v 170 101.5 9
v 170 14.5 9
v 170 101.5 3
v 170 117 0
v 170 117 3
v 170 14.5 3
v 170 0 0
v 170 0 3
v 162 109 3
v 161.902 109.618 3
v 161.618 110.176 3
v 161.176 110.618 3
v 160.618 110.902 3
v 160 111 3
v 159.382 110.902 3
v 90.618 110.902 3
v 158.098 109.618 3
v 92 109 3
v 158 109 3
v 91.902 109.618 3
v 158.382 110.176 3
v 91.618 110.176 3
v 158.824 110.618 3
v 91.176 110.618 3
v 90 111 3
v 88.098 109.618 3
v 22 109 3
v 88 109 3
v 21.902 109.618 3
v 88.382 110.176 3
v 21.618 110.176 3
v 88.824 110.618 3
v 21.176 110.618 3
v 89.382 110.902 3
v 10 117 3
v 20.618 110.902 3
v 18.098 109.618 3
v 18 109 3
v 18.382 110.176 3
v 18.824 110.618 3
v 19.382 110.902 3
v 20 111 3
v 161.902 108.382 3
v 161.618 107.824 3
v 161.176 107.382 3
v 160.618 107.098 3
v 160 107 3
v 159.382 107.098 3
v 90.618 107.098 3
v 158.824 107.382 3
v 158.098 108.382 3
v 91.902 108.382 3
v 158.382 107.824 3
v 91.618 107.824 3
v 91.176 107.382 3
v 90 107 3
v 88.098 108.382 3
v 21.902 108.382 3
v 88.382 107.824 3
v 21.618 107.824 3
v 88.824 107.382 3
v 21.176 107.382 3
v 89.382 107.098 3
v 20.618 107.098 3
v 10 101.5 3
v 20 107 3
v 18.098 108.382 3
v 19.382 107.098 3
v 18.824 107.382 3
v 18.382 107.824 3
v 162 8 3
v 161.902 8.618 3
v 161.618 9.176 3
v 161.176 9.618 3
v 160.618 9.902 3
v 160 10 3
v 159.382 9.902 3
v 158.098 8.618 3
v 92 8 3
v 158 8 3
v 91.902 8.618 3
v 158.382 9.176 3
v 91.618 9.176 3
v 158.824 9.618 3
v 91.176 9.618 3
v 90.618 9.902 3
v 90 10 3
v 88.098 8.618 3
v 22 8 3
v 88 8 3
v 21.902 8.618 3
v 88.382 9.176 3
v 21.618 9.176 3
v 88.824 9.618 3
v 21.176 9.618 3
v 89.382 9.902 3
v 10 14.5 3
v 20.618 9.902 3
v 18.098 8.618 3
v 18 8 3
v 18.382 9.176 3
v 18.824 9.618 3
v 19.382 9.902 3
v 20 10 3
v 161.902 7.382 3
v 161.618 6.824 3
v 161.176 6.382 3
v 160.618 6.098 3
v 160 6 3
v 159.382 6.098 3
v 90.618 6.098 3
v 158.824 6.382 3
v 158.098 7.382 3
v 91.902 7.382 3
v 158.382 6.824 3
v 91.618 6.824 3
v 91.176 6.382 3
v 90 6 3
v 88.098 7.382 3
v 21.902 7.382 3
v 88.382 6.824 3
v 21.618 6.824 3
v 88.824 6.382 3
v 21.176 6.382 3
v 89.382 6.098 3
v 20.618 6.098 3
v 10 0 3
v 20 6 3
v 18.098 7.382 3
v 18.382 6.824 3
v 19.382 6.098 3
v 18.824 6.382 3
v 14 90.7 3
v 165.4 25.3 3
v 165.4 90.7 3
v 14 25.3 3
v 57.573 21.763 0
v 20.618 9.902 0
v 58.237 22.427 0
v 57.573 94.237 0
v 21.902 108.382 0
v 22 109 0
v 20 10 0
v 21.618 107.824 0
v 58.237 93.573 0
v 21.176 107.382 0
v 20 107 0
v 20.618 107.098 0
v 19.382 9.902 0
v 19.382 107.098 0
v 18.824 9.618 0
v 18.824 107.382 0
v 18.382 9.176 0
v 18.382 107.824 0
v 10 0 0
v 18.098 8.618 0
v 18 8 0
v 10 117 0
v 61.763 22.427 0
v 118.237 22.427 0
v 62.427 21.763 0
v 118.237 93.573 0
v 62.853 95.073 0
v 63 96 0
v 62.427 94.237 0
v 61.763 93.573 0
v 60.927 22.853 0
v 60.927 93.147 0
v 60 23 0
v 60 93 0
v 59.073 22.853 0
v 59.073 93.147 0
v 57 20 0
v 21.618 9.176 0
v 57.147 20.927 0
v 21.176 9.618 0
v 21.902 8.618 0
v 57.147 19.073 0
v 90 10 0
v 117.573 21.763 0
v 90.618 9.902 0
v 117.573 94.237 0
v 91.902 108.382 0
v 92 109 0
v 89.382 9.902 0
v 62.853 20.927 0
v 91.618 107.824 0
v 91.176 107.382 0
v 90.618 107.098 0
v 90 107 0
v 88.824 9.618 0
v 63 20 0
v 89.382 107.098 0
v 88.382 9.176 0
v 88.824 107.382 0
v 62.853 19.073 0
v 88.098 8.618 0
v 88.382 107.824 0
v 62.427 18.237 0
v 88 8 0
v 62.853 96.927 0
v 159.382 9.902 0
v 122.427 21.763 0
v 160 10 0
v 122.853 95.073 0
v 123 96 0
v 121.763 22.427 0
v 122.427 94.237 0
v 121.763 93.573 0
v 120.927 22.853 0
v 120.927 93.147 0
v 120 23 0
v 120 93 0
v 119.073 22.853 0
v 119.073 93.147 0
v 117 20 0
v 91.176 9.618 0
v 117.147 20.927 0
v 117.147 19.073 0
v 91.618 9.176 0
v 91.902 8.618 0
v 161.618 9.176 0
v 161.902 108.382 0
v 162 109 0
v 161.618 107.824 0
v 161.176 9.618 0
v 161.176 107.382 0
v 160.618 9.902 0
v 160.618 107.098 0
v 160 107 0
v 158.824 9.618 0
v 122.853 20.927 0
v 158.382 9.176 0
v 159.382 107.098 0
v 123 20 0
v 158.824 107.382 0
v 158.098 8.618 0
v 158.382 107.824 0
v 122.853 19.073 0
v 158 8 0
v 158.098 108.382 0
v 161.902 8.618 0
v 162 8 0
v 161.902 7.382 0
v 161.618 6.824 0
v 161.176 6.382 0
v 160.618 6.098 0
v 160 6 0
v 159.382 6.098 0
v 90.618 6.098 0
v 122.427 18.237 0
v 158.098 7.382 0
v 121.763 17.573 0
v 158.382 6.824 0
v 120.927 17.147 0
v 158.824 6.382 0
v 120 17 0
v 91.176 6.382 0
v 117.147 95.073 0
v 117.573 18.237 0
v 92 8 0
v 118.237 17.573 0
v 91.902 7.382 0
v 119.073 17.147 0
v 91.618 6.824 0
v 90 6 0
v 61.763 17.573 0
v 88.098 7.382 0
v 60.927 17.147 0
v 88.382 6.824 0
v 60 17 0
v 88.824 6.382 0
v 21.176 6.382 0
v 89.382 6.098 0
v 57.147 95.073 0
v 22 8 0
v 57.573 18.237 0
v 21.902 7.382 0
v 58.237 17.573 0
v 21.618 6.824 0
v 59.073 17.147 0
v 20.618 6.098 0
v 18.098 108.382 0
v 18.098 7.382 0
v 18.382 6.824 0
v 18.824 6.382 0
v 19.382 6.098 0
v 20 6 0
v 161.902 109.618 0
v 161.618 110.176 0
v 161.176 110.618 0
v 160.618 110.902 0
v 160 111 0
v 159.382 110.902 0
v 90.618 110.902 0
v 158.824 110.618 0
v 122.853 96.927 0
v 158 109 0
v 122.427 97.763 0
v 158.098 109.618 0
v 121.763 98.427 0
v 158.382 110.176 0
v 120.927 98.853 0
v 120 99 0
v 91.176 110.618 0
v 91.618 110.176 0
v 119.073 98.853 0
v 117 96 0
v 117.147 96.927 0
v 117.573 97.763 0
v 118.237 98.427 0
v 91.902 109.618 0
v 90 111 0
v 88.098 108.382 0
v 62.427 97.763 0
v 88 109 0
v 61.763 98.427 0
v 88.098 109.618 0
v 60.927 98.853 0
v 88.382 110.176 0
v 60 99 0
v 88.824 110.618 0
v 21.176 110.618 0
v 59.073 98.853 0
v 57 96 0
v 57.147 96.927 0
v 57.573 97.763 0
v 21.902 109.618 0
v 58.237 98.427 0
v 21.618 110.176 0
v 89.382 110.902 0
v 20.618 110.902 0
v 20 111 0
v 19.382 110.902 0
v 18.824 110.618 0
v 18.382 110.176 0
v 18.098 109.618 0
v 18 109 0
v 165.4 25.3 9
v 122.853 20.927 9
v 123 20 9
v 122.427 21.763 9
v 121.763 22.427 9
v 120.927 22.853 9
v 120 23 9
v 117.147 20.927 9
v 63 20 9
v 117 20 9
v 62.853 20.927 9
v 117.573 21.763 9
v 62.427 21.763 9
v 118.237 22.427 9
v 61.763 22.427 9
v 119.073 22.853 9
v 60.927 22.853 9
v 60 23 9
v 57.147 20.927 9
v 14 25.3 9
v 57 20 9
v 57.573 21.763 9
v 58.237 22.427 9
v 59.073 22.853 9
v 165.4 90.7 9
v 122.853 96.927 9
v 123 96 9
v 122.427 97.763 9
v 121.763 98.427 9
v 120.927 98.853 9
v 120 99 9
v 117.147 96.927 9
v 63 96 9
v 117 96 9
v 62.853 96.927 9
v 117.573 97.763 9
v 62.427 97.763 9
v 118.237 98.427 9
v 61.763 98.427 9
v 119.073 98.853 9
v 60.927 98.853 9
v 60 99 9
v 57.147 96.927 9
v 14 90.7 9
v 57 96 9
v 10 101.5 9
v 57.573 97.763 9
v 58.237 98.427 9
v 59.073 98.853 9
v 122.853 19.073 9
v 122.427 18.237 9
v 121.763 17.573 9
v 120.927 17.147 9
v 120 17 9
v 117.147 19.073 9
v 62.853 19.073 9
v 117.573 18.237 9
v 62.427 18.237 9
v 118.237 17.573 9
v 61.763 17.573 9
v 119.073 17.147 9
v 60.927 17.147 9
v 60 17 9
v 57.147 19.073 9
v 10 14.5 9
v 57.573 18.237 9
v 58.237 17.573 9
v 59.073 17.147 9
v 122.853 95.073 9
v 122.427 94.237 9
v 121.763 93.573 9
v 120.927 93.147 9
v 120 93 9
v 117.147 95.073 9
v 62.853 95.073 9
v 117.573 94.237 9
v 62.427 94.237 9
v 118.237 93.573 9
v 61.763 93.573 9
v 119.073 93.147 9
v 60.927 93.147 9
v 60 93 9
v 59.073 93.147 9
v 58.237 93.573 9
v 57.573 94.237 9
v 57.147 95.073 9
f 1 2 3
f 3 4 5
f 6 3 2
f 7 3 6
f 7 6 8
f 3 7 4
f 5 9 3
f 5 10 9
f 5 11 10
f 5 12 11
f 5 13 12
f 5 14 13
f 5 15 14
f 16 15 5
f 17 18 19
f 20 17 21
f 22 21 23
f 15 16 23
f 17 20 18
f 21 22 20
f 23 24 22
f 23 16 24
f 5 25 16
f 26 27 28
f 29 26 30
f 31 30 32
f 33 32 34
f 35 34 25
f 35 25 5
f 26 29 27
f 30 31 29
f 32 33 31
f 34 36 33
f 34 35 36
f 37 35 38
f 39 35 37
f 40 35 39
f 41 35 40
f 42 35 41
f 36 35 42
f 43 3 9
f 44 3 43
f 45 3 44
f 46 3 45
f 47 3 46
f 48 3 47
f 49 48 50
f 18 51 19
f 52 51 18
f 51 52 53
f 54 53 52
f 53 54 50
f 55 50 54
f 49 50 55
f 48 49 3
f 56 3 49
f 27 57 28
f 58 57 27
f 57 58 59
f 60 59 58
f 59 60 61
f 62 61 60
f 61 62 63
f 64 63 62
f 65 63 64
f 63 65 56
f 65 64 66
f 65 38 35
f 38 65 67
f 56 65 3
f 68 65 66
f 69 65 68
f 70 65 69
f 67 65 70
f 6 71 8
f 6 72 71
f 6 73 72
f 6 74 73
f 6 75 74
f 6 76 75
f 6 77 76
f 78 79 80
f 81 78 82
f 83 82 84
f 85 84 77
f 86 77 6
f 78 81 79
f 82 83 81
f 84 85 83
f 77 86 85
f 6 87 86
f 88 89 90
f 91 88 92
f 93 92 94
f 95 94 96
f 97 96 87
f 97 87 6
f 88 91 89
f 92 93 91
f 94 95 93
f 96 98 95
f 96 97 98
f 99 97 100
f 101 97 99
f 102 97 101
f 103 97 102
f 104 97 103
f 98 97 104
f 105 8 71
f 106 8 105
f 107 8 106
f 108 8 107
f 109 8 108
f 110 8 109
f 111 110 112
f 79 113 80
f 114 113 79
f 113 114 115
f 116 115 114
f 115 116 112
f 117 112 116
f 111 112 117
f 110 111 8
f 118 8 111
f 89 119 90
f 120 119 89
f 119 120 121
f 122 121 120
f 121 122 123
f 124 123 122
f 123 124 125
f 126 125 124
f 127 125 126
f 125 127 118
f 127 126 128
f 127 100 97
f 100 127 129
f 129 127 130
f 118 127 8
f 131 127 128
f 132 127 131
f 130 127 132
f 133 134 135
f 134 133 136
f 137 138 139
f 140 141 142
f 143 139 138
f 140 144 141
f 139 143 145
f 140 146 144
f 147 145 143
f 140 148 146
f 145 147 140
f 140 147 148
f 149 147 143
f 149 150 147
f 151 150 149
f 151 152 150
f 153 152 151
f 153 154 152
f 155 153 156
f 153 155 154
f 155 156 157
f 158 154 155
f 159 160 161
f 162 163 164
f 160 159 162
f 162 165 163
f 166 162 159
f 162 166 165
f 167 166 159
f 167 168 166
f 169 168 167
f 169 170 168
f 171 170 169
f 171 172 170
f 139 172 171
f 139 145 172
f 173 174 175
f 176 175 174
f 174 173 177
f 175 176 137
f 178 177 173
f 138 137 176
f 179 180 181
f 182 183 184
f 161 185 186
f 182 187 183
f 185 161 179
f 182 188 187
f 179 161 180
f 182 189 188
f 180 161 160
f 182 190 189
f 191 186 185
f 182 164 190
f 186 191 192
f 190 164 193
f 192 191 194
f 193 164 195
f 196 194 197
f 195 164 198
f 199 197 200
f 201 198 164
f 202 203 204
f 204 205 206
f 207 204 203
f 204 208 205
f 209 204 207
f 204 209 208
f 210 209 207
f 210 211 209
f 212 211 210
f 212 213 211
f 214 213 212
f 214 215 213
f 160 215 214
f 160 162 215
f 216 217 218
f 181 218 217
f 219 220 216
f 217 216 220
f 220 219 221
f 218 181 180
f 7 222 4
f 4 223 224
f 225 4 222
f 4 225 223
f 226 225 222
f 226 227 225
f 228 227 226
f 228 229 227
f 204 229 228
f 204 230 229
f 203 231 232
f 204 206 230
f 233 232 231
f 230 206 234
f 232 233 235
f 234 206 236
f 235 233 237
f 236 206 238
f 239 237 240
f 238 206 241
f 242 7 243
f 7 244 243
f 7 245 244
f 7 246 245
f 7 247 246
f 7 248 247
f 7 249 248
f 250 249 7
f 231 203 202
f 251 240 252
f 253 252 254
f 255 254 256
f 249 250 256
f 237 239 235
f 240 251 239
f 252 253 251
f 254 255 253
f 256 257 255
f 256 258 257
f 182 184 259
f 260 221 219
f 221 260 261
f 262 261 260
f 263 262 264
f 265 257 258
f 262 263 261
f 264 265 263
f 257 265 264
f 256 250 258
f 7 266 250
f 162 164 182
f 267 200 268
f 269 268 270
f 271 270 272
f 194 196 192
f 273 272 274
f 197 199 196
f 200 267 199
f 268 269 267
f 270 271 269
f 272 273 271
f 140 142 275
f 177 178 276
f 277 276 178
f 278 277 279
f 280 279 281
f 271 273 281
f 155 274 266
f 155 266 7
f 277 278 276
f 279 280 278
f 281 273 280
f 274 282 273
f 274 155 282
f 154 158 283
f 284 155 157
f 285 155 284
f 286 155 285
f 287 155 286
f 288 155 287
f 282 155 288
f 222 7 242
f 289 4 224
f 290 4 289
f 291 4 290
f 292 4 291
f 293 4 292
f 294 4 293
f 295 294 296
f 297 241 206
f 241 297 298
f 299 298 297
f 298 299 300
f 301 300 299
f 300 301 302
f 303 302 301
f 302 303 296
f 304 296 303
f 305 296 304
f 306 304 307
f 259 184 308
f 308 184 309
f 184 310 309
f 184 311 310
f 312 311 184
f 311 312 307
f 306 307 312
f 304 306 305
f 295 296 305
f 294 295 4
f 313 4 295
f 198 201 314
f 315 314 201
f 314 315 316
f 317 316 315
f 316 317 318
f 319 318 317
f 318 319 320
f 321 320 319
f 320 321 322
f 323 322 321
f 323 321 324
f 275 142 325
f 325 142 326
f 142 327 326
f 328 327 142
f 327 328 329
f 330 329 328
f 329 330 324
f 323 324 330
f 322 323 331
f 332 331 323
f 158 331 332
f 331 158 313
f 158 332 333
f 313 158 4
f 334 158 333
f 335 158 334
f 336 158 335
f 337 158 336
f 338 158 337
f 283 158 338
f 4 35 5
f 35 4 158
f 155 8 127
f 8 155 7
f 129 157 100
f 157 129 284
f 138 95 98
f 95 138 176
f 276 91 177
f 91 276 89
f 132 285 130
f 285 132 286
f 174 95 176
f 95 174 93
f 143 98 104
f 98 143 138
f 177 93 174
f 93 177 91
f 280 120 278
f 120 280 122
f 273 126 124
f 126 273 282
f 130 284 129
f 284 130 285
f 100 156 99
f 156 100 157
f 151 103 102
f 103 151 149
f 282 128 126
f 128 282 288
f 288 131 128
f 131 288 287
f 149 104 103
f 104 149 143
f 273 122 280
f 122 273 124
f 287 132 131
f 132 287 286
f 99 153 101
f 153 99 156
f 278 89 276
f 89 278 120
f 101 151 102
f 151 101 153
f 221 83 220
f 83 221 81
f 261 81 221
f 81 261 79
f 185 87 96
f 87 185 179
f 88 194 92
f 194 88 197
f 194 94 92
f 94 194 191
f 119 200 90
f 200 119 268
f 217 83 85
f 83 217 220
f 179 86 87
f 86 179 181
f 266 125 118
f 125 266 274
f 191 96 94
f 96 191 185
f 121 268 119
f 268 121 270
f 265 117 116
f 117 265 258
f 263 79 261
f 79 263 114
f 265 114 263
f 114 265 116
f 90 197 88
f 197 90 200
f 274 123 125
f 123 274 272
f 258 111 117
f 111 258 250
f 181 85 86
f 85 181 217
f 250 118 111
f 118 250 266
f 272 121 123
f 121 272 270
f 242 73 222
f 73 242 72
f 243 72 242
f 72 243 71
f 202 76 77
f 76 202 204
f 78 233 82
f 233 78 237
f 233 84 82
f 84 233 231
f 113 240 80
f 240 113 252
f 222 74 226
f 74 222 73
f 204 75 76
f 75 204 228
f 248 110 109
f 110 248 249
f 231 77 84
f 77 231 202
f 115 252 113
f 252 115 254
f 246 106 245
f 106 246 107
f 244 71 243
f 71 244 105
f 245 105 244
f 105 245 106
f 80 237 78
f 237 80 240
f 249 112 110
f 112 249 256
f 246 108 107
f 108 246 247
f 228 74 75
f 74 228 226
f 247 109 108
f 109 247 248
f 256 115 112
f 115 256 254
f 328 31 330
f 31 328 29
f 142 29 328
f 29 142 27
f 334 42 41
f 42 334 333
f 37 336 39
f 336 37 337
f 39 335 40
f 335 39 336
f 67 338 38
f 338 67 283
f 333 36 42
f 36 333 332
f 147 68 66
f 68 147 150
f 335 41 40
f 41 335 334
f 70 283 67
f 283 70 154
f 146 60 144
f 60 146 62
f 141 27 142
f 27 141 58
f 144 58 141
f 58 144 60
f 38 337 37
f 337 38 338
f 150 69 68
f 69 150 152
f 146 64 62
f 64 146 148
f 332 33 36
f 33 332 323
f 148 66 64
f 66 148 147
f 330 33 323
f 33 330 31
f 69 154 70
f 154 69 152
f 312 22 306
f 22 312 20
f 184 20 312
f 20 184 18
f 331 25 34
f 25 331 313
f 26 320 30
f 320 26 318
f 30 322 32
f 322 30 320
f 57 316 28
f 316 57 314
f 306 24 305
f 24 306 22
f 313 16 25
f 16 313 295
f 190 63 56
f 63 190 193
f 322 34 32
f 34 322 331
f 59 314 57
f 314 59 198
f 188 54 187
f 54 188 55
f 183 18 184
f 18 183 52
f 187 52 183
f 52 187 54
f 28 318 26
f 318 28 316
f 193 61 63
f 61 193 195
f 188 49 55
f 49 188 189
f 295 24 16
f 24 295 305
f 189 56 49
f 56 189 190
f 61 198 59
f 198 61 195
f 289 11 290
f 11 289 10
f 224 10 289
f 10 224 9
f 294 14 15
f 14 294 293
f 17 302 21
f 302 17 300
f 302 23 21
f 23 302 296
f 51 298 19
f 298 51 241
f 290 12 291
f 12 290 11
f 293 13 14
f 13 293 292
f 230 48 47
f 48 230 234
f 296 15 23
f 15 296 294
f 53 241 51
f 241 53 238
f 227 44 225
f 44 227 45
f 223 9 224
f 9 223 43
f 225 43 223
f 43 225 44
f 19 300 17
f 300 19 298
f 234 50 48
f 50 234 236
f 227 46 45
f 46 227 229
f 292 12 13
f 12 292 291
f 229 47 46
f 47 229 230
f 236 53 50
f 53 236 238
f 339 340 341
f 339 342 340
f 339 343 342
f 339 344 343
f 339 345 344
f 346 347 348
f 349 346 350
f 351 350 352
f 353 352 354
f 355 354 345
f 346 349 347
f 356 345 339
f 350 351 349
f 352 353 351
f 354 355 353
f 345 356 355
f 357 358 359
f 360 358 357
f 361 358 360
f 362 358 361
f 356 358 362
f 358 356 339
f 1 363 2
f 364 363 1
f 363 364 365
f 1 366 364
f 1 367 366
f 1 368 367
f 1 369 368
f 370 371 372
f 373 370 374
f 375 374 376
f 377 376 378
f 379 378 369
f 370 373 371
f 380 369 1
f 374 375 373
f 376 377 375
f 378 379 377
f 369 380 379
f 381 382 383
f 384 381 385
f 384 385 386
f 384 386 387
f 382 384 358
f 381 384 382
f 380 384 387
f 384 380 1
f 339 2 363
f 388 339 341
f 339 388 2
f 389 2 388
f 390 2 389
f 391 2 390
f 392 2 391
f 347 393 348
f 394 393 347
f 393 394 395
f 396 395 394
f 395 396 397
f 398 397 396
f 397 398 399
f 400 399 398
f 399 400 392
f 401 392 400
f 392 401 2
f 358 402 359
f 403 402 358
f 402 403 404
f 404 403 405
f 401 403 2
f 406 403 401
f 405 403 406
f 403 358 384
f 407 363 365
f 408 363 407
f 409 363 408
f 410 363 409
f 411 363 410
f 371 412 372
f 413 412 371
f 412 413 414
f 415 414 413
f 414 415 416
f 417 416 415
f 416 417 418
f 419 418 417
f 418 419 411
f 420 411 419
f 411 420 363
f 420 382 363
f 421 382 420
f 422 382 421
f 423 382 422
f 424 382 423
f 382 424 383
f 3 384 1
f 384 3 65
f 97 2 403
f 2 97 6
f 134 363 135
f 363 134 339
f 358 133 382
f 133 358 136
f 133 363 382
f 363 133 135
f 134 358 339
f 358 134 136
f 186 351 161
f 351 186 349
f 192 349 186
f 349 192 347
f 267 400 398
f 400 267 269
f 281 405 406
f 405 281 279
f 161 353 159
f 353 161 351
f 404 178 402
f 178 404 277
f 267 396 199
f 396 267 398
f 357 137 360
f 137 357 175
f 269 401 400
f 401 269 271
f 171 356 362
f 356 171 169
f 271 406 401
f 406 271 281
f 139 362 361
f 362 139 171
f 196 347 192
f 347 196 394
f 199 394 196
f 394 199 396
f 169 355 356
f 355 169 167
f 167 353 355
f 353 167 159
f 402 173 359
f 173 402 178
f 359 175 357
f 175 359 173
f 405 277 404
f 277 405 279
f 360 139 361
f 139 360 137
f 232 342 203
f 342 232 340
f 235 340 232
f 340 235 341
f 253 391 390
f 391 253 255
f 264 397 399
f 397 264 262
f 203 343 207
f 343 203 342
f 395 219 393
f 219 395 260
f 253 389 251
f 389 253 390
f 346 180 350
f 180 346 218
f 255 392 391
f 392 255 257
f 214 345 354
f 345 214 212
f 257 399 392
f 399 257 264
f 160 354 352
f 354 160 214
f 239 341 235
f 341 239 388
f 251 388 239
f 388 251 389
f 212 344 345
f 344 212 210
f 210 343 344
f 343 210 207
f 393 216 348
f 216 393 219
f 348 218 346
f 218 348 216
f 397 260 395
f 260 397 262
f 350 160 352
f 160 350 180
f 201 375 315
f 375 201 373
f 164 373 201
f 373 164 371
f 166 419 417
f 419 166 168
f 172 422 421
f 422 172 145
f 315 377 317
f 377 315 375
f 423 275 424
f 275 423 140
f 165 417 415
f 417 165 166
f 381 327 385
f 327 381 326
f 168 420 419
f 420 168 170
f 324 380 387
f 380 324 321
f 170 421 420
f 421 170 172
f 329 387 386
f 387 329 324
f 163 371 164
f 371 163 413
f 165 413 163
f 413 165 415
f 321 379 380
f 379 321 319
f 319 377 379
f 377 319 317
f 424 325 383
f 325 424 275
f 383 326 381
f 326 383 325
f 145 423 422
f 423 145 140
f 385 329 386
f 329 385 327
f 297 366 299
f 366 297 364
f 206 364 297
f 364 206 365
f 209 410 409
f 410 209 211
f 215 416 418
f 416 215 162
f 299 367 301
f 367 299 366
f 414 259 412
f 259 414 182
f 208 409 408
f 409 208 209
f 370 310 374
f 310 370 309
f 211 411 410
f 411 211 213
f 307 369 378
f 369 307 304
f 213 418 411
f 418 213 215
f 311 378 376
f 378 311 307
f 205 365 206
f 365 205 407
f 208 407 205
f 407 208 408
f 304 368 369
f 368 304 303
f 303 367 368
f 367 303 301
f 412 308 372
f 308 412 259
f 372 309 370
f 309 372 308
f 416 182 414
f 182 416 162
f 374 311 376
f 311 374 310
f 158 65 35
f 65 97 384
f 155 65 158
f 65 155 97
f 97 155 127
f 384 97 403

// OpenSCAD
$fn=20;

difference() {
union() {
    difference(){
        cube([170,117,3]);
        
        translate([20,8,2.5])
        cylinder(6,2,2,true);
        
        translate([90,8,2.5])
        cylinder(6,2,2,true);
        
        translate([10+150,8,2.5])
        cylinder(6,2,2,true);
        
        translate([20,109,2.5])
        cylinder(6,2,2,true);
        
        translate([90,109,2.5])
        cylinder(6,2,2,true);
        
        translate([10+150,109,2.5])
        cylinder(6,2,2,true);
        
        
    }
        
    translate([0,14.5,3])
    difference()
    {
        cube([170,117-30,6]);
        translate([14,10.8,0])
        cube([151.4,65.4,10]);
    }   
    
}
    translate([60,20,2.5])
        cylinder(30,3,3,true);

    translate([120,20,2.5])
        cylinder(30,3,3,true);

    translate([60,117-21,2.5])
        cylinder(30,3,3,true);

    translate([120,117-21,2.5])
        cylinder(30,3,3,true);

    cube([10,117,10]);
}
